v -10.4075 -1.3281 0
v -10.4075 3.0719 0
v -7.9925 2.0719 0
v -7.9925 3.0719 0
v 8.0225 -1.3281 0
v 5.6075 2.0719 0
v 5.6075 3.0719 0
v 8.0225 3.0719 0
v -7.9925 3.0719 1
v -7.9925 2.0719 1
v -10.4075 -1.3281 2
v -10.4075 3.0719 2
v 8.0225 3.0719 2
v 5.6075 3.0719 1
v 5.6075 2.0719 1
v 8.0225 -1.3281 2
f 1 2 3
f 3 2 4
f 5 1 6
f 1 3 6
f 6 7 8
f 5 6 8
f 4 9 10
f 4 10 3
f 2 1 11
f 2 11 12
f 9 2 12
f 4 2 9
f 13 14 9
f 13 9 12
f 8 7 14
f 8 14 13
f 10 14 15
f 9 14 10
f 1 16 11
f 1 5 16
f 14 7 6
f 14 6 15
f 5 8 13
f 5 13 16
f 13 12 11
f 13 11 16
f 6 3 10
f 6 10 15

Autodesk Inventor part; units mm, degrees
ref_plane "YZ Plane" through (0, 0, 0) normal (1, 0, 0) x (0, 1, 0)
ref_plane "XZ Plane" through (0, 0, 0) normal (0, 1, 0) x (-1, 0, 0)
ref_plane "XY Plane" through (0, 0, 0) normal (0, 0, 1) x (1, 0, 0)
sketch "Sketch1" plane through (0, 0, 0) normal (0, 0, 1) x (1, 0, 0)
  line L0 (8.0225, -1.3281) -> (-10.4075, -1.3281)
  line L1 (-10.4075, -1.3281) -> (-10.4075, 3.0719)
  line L2 (-10.4075, 3.0719) -> (8.0225, 3.0719)
  line L3 (8.0225, 3.0719) -> (8.0225, -1.3281)
  point P0 (0, 0)
  dimension "d0" = 18.43
  dimension "d1" = 4.4
extrude "Extrusion1" add sketch "Sketch1" along normal blind 2
sketch "Sketch2" plane through (-10.4075, 3.0719, 0) normal (0, 1, 0) x (1, 0, 0)
  line L0 (0, 0) -> (18.43, 0) projected
  line L1 (18.43, 0) -> (18.43, -2) projected
  line L2 (2.415, 0) -> (16.015, 0)
  line L3 (16.015, 0) -> (16.015, -1)
  line L4 (16.015, -1) -> (2.415, -1)
  line L5 (2.415, -1) -> (2.415, 0)
  point P0 (10.4075, 0)
  dimension "d4" = 13.6
  dimension "d5" = 2.415
  dimension "d6" = 0
  dimension "d7" = 1
extrude "Extrusion2" cut sketch "Sketch2" against normal blind 1
properties part number "FlatFlex26"
